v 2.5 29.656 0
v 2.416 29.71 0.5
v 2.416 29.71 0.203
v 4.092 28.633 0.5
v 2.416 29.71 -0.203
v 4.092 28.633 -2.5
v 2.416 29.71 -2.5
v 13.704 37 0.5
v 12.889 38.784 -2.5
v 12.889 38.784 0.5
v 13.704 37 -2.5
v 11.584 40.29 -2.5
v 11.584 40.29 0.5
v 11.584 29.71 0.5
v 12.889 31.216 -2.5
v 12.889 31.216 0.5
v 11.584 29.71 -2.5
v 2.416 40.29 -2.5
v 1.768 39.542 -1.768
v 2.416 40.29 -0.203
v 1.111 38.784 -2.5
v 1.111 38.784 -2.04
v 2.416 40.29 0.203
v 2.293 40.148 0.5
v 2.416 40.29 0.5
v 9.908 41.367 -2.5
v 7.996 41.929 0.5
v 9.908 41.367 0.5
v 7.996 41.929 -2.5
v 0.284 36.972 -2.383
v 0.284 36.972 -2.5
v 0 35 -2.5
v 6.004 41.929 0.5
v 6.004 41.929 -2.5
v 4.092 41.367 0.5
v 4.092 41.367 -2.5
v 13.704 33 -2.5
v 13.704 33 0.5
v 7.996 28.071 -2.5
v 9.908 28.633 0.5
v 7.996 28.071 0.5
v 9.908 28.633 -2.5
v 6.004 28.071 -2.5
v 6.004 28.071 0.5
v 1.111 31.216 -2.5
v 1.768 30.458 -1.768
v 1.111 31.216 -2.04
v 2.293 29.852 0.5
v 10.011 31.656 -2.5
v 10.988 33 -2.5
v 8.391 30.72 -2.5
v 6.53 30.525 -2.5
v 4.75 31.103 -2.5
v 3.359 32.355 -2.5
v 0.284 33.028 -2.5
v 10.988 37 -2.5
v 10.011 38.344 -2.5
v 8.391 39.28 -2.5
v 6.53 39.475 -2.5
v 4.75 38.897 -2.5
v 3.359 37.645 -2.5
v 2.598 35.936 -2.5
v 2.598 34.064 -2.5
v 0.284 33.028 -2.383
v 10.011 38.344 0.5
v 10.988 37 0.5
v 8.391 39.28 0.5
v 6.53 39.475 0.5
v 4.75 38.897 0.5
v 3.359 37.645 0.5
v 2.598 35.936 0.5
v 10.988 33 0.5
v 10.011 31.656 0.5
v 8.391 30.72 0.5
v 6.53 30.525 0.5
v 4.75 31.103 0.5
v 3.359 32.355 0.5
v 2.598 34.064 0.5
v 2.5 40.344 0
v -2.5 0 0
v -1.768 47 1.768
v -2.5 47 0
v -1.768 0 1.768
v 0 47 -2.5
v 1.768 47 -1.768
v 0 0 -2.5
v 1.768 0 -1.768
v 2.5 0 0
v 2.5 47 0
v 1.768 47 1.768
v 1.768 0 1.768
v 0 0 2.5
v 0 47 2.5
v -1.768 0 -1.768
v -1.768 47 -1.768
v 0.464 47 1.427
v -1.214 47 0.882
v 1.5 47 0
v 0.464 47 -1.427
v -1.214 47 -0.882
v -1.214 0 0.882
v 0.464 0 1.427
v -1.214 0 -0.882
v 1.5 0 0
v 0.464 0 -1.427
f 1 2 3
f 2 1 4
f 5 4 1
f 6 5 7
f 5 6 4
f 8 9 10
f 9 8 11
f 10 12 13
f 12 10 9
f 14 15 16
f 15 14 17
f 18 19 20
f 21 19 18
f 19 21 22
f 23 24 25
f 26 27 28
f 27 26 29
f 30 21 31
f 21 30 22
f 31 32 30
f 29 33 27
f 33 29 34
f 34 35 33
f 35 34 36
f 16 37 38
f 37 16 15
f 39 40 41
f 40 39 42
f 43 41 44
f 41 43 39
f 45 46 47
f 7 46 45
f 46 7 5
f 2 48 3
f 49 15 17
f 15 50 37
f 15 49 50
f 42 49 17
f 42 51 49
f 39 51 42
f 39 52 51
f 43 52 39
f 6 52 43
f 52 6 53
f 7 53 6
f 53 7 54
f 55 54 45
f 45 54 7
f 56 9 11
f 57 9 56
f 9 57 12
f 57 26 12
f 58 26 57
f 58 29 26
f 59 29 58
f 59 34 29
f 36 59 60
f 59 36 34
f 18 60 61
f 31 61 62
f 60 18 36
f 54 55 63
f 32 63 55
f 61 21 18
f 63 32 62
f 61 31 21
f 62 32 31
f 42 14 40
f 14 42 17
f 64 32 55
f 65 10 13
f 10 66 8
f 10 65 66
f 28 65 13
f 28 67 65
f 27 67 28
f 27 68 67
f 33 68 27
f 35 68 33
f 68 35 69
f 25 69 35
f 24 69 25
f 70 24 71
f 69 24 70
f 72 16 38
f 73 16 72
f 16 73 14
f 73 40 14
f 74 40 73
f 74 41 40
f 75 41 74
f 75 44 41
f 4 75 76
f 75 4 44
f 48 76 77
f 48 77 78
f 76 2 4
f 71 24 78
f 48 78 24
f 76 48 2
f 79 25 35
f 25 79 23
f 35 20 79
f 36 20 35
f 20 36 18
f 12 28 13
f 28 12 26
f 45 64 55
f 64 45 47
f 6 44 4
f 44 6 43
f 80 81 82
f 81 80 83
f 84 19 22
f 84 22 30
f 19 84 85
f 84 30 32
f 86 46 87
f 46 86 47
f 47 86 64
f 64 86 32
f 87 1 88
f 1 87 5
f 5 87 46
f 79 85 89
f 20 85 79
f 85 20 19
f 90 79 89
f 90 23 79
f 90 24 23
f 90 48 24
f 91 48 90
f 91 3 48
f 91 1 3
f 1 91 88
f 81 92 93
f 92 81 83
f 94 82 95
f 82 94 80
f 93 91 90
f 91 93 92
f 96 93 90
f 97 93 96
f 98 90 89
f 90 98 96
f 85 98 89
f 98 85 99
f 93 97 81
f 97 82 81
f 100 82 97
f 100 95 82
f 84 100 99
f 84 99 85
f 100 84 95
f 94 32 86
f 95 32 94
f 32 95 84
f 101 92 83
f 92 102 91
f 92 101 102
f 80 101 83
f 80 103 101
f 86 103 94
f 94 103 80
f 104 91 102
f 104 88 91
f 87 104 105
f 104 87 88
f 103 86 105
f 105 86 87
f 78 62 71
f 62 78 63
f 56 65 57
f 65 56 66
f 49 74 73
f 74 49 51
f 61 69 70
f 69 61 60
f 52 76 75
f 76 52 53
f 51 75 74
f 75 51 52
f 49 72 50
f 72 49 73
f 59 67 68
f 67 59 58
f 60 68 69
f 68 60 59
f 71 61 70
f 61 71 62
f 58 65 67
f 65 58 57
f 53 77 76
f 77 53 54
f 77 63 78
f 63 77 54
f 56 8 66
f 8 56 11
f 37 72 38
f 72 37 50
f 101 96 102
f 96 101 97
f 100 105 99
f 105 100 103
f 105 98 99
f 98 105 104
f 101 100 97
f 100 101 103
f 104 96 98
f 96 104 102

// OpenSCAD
/* This a replacement piece for a pair of Peltor earmuffs which one
of the (brackets? I dunno. The little slidey right angle bits.) on
the side had broken. Works perfectly. Could be made to look a bit
more like the piece it is replacing though.*/

gap=4;

rotate([-90,0,0])
union() {
    difference() {
        union() {
            translate([7,2.5,35])
            rotate([90,0,0])
            cylinder(3,7,7);
            cylinder(47,2.5,2.5);
        }
        translate([0,0,-1])cylinder(49,1.5,1.5);
        translate([7,3.5,35])
        rotate([90,0,0])
        union() {
        cylinder(8.5,4.5,4.5);
        translate([0,-gap/2,0])cube([10,gap,10]);
        }
    }

}
